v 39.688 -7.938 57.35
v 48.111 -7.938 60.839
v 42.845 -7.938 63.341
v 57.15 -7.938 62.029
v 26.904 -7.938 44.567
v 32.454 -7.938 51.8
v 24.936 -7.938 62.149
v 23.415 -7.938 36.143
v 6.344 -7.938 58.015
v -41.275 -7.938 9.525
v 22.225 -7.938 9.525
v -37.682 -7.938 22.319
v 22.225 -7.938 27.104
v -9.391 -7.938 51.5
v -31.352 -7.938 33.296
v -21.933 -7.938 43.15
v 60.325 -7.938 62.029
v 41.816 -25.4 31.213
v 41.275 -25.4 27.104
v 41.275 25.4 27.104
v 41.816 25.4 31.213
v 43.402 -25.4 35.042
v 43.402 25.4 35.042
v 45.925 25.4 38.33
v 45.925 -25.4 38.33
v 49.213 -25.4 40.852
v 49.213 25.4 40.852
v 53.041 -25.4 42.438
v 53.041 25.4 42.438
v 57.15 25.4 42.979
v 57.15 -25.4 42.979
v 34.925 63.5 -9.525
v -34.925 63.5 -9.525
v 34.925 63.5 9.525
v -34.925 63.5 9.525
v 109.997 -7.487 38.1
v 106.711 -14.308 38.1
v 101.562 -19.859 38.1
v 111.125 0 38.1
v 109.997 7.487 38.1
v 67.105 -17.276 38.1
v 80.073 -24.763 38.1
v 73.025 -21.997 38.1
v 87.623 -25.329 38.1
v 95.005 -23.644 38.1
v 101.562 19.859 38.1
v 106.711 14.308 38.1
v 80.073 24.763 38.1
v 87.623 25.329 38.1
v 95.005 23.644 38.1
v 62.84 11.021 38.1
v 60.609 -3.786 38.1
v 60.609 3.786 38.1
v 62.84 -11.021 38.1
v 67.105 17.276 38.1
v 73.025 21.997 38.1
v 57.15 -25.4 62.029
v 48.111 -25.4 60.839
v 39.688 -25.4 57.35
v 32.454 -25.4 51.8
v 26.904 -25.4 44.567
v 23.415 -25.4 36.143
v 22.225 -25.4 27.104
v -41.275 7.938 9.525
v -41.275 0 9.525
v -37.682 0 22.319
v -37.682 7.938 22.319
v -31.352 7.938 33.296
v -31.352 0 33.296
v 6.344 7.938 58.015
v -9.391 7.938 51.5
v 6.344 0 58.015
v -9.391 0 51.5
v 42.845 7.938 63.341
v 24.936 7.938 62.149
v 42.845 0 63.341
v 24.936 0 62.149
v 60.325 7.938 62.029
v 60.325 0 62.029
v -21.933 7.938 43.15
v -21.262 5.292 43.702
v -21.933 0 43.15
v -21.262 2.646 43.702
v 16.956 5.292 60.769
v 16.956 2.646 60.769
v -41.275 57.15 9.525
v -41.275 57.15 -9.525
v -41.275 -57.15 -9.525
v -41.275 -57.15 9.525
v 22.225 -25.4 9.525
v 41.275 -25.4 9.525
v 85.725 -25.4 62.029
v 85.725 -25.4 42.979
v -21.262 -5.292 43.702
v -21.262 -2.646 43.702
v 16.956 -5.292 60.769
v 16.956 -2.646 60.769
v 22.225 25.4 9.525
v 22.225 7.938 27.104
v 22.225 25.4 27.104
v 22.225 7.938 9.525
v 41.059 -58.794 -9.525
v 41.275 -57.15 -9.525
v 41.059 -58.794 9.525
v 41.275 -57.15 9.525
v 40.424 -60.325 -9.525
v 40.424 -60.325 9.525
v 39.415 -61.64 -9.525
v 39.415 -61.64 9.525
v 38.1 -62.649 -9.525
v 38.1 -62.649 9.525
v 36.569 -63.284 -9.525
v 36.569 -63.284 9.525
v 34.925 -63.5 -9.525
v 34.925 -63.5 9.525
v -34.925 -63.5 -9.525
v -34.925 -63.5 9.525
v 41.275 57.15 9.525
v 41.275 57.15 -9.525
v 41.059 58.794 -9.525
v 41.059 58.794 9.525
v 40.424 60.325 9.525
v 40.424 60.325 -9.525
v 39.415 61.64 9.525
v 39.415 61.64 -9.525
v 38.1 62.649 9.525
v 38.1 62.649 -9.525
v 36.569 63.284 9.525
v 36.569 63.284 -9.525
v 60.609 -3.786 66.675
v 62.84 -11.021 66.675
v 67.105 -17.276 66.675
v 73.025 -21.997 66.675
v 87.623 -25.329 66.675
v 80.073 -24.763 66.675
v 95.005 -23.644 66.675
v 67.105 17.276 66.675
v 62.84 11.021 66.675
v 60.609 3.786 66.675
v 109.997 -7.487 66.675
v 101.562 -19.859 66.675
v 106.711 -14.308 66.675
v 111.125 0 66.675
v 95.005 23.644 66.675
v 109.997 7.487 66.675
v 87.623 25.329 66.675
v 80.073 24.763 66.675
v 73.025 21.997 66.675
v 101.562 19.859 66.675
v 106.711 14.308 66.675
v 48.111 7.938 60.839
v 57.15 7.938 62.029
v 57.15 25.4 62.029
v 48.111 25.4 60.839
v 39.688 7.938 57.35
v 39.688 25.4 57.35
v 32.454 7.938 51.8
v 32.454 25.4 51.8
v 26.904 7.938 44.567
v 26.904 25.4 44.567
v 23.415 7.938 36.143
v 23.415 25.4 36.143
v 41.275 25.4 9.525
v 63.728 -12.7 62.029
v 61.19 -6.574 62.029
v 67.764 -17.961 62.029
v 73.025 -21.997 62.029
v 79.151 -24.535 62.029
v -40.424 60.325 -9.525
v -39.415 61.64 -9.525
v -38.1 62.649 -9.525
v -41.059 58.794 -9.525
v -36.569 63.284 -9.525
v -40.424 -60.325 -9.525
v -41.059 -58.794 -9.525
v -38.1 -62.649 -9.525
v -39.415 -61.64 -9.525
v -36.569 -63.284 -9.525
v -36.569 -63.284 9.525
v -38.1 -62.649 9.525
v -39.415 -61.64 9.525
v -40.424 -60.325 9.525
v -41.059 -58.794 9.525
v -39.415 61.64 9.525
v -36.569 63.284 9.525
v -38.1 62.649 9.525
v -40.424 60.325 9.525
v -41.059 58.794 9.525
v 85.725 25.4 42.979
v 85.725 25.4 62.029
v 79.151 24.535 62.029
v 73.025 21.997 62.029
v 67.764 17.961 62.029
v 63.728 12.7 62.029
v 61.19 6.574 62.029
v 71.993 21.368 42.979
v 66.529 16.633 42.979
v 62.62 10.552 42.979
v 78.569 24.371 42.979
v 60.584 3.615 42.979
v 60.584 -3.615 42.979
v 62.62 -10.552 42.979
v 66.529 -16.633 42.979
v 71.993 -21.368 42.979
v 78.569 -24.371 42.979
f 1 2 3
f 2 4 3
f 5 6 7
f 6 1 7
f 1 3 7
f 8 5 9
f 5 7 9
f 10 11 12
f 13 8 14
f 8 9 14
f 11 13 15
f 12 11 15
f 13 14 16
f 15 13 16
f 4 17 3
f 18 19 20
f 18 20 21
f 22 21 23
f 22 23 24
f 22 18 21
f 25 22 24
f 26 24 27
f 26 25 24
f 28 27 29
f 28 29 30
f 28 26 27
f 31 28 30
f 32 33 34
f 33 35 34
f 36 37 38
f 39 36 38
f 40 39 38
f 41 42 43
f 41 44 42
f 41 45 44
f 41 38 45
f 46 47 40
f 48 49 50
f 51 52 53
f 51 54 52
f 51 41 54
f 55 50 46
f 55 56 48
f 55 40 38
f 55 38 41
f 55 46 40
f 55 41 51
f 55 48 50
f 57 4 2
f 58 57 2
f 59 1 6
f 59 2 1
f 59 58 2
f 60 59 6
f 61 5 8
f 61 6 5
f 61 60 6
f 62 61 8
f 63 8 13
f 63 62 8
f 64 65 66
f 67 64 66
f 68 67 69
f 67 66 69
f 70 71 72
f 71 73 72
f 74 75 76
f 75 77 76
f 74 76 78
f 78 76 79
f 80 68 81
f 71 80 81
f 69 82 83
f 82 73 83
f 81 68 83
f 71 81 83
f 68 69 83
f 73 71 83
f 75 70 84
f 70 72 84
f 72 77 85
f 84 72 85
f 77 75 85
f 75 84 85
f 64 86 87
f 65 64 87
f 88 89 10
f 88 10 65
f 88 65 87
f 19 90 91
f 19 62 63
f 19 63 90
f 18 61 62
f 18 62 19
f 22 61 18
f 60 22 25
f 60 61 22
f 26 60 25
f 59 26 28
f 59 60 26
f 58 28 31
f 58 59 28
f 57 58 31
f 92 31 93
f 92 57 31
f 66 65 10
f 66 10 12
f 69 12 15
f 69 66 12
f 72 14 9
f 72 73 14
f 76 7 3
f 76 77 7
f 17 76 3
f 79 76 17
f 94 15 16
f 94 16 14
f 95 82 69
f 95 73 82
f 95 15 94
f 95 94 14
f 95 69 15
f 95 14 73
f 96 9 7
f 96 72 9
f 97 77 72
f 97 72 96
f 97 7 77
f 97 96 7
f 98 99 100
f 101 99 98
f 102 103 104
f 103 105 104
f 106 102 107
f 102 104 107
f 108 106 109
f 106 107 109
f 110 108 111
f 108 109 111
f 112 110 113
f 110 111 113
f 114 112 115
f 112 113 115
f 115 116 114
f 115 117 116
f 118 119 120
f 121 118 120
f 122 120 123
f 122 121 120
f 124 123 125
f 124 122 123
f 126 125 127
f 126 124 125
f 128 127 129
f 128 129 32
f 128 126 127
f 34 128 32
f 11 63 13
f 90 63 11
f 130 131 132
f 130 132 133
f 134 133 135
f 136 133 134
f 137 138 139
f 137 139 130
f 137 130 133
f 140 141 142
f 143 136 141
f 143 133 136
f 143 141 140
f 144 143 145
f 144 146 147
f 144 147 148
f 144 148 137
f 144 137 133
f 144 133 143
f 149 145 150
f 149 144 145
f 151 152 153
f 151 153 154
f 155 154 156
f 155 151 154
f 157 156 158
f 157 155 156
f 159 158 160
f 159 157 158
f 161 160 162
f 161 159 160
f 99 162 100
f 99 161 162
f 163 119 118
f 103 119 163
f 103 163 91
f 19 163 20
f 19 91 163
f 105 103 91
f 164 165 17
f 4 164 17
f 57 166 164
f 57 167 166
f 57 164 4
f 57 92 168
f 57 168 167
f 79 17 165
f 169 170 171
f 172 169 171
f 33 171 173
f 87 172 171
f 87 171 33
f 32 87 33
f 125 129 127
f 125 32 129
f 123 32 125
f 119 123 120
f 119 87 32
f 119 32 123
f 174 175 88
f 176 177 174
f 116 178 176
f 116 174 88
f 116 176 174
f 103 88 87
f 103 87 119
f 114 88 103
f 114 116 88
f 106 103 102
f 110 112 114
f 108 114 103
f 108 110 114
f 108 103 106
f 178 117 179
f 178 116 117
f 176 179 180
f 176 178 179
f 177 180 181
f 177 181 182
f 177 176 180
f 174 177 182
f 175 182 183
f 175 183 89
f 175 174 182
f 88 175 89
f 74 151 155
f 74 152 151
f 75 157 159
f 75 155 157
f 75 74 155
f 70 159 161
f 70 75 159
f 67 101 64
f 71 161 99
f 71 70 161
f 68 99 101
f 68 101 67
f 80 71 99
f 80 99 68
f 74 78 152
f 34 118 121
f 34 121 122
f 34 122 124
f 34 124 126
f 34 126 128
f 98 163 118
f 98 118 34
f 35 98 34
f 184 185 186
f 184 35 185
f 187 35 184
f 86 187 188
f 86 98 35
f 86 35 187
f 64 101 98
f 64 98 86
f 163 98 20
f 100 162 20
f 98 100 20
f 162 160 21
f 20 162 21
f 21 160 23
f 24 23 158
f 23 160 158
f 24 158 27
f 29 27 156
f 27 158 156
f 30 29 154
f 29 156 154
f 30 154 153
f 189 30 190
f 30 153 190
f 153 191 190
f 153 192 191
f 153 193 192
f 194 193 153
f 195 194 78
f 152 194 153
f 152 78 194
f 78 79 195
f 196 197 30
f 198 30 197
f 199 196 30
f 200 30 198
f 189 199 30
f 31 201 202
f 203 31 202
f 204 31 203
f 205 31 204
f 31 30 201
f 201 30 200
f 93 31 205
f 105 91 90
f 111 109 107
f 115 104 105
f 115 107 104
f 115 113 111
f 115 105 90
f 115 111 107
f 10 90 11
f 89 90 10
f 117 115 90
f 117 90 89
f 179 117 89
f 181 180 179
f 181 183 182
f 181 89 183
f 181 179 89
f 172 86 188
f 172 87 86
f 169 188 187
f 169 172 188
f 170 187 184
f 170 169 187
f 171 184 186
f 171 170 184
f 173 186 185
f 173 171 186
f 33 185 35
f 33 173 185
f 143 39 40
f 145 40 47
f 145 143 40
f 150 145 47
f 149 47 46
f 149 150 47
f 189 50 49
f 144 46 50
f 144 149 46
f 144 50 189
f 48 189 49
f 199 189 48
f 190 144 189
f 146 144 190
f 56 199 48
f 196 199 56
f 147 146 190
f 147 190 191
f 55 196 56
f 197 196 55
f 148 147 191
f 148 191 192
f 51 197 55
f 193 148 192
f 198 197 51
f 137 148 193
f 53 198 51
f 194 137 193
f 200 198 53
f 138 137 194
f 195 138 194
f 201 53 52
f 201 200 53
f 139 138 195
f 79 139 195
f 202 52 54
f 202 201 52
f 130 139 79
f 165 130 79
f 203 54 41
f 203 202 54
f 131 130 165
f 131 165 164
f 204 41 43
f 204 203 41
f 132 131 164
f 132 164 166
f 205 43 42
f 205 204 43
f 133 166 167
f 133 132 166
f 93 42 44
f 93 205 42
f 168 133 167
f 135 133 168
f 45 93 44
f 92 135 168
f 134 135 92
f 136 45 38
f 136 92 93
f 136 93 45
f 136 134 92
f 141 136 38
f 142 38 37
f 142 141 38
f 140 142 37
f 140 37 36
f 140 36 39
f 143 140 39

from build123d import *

# Parameters (mm, degrees)
F1_DEPTH = 63.5
F0_W     = 25.4
F0_H     = 19.05
F2_DEPTH = 25.4
F3_DEPTH = 7.9375
F5_R     = 6.35


with BuildPart() as f1:
    # F0 (on Front) → F1 (new body, symmetric)
    with BuildSketch(Plane.XZ):
        Polygon((-41.275, -9.525), (41.275, -9.525), (41.275, 9.525), (22.225, 9.525), (-41.275, 9.525), align=None)
    extrude(amount=F1_DEPTH, both=True)

    # F0 (on Front) → F2 (join, symmetric)
    with BuildSketch(Plane.XZ):
        with BuildLine():
            Line((22.225, 9.525), (41.275, 9.525))
            Line((41.275, 9.525), (41.275, 27.10419))
            ThreePointArc((41.275, 27.10419), (45.92468, 38.32951), (57.15, 42.97919))
            Line((57.15, 42.97919), (60.325, 42.97919))
            Line((60.325, 42.97919), (60.325, 62.02919))
            Line((60.325, 62.02919), (57.15, 62.02919))
            ThreePointArc((57.15, 62.02919), (32.454296, 51.799894), (22.225, 27.10419))
            Line((22.225, 27.10419), (22.225, 9.525))
        make_face()
        with Locations((73.025, 52.50419)):
            Rectangle(F0_W, F0_H)
    extrude(amount=F2_DEPTH, both=True)

    # F0 (on Front) → F3 (join, symmetric)
    with BuildSketch(Plane.XZ):
        with BuildLine():
            add(Edge.make_bspline(
                [(-41.275, 9.525), (-34.716684, 52.690328), (18.733253, 68.238799), (60.325, 62.02919)],
                knots=[0, 0, 0, 0, 114.364549, 114.364549, 114.364549, 114.364549], degree=3))
            Line((-41.275, 9.525), (22.225, 9.525))
            Line((22.225, 9.525), (22.225, 27.10419))
            ThreePointArc((22.225, 27.10419), (32.454296, 51.799894), (57.15, 62.02919))
            Line((57.15, 62.02919), (60.325, 62.02919))
        make_face()
    extrude(amount=F3_DEPTH, both=True)

    # F0 (on Front) → F4 (revolve)
    with BuildSketch(Plane.XZ):
        Polygon((85.725, 66.675), (85.725, 62.02919), (85.725, 42.97919), (85.725, 38.1), (111.125, 38.1), (111.125, 66.675), align=None)
    revolve(axis=Axis((85.725, 0, 52.3875), (0, 0, 1)))

    # F5
    f5_edges = [f1.edges().sort_by_distance(p)[0] for p in [
        (41.275, -63.5, 0),
        (41.275, 63.5, 0),
        (-41.275, -63.5, 0),
        (-41.275, 63.5, 0),
    ]]
    fillet(f5_edges, radius=F5_R)


solid = f1.part
